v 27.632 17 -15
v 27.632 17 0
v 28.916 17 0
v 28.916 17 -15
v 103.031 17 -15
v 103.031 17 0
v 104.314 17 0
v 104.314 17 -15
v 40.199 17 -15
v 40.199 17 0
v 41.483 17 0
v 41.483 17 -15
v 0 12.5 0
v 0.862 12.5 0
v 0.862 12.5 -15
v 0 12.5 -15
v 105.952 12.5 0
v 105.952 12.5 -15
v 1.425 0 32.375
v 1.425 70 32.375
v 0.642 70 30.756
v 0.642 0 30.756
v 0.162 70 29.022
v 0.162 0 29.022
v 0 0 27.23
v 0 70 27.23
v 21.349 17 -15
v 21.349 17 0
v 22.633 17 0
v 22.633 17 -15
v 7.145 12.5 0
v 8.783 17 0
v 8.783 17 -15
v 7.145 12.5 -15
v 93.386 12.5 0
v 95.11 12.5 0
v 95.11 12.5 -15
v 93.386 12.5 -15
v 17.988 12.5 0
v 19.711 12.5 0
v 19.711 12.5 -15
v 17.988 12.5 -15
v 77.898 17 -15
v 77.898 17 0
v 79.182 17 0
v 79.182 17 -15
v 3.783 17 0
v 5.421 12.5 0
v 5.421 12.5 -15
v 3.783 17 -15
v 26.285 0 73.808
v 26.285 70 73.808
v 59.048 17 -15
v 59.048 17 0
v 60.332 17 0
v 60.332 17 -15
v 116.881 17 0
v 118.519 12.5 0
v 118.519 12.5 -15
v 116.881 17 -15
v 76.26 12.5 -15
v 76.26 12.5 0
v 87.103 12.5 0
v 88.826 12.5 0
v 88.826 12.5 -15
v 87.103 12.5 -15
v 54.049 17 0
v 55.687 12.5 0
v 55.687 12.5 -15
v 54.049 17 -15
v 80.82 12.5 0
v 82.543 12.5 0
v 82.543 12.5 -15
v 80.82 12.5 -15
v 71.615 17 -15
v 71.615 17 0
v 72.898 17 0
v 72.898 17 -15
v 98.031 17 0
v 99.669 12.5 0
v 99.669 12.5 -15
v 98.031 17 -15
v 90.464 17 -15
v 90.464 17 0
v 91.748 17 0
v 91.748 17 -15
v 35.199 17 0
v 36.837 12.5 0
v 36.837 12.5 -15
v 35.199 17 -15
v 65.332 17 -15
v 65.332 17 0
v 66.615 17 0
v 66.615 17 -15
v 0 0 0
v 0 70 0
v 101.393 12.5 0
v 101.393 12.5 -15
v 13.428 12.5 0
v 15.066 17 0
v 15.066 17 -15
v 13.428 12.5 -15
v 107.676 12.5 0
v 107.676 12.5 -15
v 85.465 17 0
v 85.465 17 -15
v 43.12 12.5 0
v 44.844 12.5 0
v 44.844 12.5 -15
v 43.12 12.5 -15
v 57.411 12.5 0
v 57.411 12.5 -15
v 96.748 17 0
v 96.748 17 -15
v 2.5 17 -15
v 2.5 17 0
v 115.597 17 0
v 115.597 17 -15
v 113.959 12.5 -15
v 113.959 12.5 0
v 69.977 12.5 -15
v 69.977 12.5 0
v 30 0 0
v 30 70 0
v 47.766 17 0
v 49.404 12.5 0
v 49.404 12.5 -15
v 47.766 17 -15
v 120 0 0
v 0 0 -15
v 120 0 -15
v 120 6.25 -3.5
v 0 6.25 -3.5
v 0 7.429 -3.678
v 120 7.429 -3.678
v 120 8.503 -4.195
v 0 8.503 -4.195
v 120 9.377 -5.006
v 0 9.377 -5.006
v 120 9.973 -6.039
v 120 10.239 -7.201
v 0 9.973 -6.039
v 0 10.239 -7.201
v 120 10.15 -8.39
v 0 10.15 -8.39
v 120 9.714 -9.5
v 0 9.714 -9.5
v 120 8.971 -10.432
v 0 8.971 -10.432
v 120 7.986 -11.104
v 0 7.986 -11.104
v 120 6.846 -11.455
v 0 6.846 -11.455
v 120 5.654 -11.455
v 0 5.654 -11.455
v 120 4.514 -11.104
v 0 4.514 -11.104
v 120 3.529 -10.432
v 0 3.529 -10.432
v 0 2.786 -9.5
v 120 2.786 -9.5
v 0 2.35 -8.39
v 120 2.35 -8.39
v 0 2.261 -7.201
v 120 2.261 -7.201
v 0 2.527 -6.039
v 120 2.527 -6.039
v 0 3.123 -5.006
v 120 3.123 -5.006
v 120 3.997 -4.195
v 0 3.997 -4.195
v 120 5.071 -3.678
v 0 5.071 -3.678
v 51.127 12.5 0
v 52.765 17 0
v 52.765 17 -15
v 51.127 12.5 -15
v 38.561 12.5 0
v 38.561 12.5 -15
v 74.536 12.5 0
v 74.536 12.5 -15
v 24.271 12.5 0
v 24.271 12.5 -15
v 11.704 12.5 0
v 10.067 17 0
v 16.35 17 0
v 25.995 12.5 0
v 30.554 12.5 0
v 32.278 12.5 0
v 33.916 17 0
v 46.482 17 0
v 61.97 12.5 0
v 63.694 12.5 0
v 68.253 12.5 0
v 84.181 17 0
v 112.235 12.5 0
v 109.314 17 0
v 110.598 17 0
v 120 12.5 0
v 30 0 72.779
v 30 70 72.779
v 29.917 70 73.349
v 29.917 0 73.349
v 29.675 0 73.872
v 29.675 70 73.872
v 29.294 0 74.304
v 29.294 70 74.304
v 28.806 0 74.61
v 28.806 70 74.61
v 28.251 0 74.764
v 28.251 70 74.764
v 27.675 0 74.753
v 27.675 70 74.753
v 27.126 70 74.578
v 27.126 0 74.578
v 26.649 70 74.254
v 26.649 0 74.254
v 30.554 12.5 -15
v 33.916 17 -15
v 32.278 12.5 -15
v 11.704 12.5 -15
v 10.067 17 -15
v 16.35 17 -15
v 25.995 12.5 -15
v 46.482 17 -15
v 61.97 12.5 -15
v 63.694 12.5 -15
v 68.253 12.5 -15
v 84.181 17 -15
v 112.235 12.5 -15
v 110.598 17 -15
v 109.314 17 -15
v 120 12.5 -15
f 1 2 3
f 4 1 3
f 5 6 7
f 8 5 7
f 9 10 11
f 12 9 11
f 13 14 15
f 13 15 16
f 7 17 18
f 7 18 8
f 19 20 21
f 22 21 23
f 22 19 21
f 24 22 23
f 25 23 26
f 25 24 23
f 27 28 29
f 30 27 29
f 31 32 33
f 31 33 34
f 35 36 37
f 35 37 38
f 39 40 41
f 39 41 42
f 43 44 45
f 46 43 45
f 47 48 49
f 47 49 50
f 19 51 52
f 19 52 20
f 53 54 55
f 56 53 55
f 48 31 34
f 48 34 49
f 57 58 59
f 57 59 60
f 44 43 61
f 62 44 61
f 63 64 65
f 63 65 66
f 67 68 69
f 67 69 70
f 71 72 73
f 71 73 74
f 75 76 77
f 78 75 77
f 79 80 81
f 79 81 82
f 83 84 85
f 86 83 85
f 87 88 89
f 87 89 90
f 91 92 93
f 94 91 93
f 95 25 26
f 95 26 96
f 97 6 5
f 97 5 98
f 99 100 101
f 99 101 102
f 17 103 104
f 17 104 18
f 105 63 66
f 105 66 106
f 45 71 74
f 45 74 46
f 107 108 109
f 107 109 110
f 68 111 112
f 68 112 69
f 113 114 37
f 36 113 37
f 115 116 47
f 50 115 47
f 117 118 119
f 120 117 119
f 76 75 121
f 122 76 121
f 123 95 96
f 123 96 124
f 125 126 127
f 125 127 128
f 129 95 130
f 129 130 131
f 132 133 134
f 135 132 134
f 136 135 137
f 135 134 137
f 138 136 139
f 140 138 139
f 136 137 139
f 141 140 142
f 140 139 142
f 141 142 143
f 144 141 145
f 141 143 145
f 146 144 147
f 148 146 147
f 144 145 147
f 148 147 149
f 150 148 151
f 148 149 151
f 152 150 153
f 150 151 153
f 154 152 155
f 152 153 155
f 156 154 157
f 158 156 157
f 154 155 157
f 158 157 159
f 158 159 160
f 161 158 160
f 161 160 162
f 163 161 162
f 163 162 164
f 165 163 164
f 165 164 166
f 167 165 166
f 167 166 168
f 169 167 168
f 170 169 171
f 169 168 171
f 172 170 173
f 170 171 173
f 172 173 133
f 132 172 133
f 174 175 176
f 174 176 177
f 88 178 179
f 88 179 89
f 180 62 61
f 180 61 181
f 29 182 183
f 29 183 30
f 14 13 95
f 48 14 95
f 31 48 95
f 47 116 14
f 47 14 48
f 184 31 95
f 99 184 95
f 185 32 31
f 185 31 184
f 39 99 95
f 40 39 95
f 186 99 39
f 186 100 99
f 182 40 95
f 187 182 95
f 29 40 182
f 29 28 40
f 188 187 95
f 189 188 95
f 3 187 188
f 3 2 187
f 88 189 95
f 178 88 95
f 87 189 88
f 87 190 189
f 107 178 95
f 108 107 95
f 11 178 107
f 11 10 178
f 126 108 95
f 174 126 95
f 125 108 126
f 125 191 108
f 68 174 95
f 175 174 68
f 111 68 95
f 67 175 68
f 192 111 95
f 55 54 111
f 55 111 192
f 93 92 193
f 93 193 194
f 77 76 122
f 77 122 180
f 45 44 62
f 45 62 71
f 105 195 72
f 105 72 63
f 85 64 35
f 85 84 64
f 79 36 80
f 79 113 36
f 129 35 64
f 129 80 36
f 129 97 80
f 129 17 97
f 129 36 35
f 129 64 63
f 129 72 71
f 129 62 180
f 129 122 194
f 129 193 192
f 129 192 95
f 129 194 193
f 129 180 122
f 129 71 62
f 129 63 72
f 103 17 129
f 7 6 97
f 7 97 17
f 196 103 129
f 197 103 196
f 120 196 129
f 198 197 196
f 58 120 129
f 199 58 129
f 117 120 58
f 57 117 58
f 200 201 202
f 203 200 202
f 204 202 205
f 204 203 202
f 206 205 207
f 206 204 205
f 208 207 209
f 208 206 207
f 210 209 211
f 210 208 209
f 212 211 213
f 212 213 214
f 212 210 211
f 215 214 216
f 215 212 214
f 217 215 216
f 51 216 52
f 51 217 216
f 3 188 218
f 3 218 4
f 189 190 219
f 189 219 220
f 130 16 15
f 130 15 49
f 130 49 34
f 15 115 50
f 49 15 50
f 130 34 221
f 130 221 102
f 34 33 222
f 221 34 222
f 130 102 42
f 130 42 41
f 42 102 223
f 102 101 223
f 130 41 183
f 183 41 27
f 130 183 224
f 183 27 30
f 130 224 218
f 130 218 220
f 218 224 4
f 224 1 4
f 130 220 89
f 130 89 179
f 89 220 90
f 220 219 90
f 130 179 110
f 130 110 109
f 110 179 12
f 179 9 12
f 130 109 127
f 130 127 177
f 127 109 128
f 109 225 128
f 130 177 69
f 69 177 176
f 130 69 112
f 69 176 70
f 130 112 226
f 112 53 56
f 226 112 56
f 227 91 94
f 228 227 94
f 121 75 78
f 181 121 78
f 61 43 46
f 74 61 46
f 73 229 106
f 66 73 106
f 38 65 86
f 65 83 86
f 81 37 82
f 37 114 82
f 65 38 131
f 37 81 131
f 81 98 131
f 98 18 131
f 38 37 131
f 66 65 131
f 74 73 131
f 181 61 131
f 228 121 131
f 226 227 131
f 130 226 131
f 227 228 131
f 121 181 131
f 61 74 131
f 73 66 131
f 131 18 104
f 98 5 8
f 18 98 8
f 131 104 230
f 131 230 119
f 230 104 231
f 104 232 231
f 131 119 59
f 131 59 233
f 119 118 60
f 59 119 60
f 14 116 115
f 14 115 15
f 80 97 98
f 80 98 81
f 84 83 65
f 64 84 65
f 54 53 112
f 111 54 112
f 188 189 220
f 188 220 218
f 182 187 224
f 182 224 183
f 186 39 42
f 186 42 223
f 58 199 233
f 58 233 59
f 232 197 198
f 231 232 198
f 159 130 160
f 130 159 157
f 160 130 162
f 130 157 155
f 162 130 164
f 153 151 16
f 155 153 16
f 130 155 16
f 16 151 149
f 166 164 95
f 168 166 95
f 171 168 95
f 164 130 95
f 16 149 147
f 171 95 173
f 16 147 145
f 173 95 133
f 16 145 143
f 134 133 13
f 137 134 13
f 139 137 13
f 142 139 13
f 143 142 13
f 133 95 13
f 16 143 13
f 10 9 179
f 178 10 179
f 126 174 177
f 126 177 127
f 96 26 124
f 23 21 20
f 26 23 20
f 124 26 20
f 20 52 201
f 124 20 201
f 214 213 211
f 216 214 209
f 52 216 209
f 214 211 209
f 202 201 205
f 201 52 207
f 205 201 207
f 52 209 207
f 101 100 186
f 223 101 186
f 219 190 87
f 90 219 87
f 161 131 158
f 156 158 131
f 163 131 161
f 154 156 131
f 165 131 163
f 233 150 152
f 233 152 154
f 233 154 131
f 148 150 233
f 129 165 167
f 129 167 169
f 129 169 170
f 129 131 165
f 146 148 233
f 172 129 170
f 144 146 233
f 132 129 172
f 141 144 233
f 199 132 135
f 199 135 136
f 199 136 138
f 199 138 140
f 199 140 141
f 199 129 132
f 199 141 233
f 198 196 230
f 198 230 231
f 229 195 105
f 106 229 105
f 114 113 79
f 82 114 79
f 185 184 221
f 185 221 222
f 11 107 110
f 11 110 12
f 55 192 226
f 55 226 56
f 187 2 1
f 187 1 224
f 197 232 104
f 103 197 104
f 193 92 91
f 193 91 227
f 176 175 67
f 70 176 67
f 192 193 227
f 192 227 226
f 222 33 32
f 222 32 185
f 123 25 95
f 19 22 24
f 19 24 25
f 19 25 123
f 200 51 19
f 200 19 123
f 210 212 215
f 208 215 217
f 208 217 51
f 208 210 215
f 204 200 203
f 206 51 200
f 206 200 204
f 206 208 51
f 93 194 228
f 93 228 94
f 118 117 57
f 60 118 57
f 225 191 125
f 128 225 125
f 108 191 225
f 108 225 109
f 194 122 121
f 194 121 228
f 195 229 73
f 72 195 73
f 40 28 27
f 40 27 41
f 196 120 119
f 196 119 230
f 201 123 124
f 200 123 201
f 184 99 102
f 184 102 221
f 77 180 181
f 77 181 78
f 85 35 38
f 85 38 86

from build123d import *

# Parameters (mm, degrees)
BLANKSKE_W               = 120
BLANKSKE_H               = 17
BLANK_DEPTH              = 15
TOOTHCUTSIM_DEPTH        = 123.122888928
TEETHCUTS_COUNT          = 20
TEETHCUTS_PITCH          = 6.2831853
RESSALTO_EXTRUS_O2_DEPTH = 70
ESBO_O8_R                = 4
CORTE_EXTRUS_O2_DEPTH    = 120


with BuildPart() as part:
    # BlankSke → Blank (new body)
    with BuildSketch(Plane.XY):
        with Locations((60, 8.5)):
            Rectangle(BLANKSKE_W, BLANKSKE_H)
    extrude(amount=-BLANK_DEPTH)

    # TooCutSkeSim → ToothCutSim (cut, through all)
    with BuildSketch(Plane.XY):
        Polygon((0.861870739, 12.5), (-0.861870739, 12.5), (-2.508981637, 17.0254), (2.508981637, 17.0254), align=None)
    toothcutsim = extrude(amount=-TOOTHCUTSIM_DEPTH, mode=Mode.SUBTRACT)

    # TeethCuts: ToothCutSim ×20
    with Locations(*[(i * TEETHCUTS_PITCH, 0, 0) for i in range(1, TEETHCUTS_COUNT)]):
        add(toothcutsim, mode=Mode.SUBTRACT)

    # Esboço8 → Corte-extrusão2 (cut)
    with BuildSketch(Plane.ZY):
        with Locations((-7.5, 6.25)):
            Circle(ESBO_O8_R)
    extrude(amount=-CORTE_EXTRUS_O2_DEPTH, mode=Mode.SUBTRACT)


with BuildPart() as body_2:
    # Esboço5 → Ressalto-extrusão2 (new body)
    with BuildSketch(Plane.XZ):
        with BuildLine():
            Line((0, 0), (30, 0))
            Line((30, 0), (30, 72.779365403))
            ThreePointArc((30, 72.779365403), (28.533867164, 74.70679526), (26.285014149, 73.808356914))
            Line((26.285014149, 73.808356914), (1.425070743, 32.375117905))
            ThreePointArc((1.425070743, 32.375117905), (0.362850718, 29.899496169), (0, 27.230160351))
            Line((0, 27.230160351), (0, 0))
        make_face()
    extrude(amount=-RESSALTO_EXTRUS_O2_DEPTH)


solid = Compound([part.part, body_2.part])
